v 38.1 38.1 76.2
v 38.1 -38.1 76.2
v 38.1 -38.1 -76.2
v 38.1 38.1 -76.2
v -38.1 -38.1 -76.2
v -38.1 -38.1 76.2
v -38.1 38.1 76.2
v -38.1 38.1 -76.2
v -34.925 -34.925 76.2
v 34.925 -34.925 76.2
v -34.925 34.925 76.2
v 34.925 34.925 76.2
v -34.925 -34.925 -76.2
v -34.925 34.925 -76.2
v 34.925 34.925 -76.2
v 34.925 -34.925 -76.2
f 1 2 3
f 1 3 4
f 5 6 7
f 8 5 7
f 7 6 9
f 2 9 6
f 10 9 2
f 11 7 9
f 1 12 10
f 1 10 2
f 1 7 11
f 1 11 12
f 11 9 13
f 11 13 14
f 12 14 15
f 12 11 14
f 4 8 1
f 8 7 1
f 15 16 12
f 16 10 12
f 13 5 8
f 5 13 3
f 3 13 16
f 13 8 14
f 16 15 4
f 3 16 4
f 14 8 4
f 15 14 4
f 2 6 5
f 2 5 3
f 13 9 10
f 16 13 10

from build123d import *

# Parameters (mm, degrees)
SKETCH3_W                = 76.2
SKETCH3_H                = 76.2
SKETCH3_W_2              = 69.85
SKETCH3_H_2              = 69.85
BOSS_EXTRUDE1_DEPTH      = 76.2
BOSS_EXTRUDE1_DEPTH_BACK = 76.2


with BuildPart() as part:
    # Sketch3 → Boss-Extrude1 (new body, two sides)
    with BuildSketch(Plane.XY) as boss_extrude1_sk:
        Rectangle(SKETCH3_W, SKETCH3_H)
        Rectangle(SKETCH3_W_2, SKETCH3_H_2, mode=Mode.SUBTRACT)
    extrude(amount=BOSS_EXTRUDE1_DEPTH)
    extrude(boss_extrude1_sk.sketch, amount=-BOSS_EXTRUDE1_DEPTH_BACK)


solid = part.part
